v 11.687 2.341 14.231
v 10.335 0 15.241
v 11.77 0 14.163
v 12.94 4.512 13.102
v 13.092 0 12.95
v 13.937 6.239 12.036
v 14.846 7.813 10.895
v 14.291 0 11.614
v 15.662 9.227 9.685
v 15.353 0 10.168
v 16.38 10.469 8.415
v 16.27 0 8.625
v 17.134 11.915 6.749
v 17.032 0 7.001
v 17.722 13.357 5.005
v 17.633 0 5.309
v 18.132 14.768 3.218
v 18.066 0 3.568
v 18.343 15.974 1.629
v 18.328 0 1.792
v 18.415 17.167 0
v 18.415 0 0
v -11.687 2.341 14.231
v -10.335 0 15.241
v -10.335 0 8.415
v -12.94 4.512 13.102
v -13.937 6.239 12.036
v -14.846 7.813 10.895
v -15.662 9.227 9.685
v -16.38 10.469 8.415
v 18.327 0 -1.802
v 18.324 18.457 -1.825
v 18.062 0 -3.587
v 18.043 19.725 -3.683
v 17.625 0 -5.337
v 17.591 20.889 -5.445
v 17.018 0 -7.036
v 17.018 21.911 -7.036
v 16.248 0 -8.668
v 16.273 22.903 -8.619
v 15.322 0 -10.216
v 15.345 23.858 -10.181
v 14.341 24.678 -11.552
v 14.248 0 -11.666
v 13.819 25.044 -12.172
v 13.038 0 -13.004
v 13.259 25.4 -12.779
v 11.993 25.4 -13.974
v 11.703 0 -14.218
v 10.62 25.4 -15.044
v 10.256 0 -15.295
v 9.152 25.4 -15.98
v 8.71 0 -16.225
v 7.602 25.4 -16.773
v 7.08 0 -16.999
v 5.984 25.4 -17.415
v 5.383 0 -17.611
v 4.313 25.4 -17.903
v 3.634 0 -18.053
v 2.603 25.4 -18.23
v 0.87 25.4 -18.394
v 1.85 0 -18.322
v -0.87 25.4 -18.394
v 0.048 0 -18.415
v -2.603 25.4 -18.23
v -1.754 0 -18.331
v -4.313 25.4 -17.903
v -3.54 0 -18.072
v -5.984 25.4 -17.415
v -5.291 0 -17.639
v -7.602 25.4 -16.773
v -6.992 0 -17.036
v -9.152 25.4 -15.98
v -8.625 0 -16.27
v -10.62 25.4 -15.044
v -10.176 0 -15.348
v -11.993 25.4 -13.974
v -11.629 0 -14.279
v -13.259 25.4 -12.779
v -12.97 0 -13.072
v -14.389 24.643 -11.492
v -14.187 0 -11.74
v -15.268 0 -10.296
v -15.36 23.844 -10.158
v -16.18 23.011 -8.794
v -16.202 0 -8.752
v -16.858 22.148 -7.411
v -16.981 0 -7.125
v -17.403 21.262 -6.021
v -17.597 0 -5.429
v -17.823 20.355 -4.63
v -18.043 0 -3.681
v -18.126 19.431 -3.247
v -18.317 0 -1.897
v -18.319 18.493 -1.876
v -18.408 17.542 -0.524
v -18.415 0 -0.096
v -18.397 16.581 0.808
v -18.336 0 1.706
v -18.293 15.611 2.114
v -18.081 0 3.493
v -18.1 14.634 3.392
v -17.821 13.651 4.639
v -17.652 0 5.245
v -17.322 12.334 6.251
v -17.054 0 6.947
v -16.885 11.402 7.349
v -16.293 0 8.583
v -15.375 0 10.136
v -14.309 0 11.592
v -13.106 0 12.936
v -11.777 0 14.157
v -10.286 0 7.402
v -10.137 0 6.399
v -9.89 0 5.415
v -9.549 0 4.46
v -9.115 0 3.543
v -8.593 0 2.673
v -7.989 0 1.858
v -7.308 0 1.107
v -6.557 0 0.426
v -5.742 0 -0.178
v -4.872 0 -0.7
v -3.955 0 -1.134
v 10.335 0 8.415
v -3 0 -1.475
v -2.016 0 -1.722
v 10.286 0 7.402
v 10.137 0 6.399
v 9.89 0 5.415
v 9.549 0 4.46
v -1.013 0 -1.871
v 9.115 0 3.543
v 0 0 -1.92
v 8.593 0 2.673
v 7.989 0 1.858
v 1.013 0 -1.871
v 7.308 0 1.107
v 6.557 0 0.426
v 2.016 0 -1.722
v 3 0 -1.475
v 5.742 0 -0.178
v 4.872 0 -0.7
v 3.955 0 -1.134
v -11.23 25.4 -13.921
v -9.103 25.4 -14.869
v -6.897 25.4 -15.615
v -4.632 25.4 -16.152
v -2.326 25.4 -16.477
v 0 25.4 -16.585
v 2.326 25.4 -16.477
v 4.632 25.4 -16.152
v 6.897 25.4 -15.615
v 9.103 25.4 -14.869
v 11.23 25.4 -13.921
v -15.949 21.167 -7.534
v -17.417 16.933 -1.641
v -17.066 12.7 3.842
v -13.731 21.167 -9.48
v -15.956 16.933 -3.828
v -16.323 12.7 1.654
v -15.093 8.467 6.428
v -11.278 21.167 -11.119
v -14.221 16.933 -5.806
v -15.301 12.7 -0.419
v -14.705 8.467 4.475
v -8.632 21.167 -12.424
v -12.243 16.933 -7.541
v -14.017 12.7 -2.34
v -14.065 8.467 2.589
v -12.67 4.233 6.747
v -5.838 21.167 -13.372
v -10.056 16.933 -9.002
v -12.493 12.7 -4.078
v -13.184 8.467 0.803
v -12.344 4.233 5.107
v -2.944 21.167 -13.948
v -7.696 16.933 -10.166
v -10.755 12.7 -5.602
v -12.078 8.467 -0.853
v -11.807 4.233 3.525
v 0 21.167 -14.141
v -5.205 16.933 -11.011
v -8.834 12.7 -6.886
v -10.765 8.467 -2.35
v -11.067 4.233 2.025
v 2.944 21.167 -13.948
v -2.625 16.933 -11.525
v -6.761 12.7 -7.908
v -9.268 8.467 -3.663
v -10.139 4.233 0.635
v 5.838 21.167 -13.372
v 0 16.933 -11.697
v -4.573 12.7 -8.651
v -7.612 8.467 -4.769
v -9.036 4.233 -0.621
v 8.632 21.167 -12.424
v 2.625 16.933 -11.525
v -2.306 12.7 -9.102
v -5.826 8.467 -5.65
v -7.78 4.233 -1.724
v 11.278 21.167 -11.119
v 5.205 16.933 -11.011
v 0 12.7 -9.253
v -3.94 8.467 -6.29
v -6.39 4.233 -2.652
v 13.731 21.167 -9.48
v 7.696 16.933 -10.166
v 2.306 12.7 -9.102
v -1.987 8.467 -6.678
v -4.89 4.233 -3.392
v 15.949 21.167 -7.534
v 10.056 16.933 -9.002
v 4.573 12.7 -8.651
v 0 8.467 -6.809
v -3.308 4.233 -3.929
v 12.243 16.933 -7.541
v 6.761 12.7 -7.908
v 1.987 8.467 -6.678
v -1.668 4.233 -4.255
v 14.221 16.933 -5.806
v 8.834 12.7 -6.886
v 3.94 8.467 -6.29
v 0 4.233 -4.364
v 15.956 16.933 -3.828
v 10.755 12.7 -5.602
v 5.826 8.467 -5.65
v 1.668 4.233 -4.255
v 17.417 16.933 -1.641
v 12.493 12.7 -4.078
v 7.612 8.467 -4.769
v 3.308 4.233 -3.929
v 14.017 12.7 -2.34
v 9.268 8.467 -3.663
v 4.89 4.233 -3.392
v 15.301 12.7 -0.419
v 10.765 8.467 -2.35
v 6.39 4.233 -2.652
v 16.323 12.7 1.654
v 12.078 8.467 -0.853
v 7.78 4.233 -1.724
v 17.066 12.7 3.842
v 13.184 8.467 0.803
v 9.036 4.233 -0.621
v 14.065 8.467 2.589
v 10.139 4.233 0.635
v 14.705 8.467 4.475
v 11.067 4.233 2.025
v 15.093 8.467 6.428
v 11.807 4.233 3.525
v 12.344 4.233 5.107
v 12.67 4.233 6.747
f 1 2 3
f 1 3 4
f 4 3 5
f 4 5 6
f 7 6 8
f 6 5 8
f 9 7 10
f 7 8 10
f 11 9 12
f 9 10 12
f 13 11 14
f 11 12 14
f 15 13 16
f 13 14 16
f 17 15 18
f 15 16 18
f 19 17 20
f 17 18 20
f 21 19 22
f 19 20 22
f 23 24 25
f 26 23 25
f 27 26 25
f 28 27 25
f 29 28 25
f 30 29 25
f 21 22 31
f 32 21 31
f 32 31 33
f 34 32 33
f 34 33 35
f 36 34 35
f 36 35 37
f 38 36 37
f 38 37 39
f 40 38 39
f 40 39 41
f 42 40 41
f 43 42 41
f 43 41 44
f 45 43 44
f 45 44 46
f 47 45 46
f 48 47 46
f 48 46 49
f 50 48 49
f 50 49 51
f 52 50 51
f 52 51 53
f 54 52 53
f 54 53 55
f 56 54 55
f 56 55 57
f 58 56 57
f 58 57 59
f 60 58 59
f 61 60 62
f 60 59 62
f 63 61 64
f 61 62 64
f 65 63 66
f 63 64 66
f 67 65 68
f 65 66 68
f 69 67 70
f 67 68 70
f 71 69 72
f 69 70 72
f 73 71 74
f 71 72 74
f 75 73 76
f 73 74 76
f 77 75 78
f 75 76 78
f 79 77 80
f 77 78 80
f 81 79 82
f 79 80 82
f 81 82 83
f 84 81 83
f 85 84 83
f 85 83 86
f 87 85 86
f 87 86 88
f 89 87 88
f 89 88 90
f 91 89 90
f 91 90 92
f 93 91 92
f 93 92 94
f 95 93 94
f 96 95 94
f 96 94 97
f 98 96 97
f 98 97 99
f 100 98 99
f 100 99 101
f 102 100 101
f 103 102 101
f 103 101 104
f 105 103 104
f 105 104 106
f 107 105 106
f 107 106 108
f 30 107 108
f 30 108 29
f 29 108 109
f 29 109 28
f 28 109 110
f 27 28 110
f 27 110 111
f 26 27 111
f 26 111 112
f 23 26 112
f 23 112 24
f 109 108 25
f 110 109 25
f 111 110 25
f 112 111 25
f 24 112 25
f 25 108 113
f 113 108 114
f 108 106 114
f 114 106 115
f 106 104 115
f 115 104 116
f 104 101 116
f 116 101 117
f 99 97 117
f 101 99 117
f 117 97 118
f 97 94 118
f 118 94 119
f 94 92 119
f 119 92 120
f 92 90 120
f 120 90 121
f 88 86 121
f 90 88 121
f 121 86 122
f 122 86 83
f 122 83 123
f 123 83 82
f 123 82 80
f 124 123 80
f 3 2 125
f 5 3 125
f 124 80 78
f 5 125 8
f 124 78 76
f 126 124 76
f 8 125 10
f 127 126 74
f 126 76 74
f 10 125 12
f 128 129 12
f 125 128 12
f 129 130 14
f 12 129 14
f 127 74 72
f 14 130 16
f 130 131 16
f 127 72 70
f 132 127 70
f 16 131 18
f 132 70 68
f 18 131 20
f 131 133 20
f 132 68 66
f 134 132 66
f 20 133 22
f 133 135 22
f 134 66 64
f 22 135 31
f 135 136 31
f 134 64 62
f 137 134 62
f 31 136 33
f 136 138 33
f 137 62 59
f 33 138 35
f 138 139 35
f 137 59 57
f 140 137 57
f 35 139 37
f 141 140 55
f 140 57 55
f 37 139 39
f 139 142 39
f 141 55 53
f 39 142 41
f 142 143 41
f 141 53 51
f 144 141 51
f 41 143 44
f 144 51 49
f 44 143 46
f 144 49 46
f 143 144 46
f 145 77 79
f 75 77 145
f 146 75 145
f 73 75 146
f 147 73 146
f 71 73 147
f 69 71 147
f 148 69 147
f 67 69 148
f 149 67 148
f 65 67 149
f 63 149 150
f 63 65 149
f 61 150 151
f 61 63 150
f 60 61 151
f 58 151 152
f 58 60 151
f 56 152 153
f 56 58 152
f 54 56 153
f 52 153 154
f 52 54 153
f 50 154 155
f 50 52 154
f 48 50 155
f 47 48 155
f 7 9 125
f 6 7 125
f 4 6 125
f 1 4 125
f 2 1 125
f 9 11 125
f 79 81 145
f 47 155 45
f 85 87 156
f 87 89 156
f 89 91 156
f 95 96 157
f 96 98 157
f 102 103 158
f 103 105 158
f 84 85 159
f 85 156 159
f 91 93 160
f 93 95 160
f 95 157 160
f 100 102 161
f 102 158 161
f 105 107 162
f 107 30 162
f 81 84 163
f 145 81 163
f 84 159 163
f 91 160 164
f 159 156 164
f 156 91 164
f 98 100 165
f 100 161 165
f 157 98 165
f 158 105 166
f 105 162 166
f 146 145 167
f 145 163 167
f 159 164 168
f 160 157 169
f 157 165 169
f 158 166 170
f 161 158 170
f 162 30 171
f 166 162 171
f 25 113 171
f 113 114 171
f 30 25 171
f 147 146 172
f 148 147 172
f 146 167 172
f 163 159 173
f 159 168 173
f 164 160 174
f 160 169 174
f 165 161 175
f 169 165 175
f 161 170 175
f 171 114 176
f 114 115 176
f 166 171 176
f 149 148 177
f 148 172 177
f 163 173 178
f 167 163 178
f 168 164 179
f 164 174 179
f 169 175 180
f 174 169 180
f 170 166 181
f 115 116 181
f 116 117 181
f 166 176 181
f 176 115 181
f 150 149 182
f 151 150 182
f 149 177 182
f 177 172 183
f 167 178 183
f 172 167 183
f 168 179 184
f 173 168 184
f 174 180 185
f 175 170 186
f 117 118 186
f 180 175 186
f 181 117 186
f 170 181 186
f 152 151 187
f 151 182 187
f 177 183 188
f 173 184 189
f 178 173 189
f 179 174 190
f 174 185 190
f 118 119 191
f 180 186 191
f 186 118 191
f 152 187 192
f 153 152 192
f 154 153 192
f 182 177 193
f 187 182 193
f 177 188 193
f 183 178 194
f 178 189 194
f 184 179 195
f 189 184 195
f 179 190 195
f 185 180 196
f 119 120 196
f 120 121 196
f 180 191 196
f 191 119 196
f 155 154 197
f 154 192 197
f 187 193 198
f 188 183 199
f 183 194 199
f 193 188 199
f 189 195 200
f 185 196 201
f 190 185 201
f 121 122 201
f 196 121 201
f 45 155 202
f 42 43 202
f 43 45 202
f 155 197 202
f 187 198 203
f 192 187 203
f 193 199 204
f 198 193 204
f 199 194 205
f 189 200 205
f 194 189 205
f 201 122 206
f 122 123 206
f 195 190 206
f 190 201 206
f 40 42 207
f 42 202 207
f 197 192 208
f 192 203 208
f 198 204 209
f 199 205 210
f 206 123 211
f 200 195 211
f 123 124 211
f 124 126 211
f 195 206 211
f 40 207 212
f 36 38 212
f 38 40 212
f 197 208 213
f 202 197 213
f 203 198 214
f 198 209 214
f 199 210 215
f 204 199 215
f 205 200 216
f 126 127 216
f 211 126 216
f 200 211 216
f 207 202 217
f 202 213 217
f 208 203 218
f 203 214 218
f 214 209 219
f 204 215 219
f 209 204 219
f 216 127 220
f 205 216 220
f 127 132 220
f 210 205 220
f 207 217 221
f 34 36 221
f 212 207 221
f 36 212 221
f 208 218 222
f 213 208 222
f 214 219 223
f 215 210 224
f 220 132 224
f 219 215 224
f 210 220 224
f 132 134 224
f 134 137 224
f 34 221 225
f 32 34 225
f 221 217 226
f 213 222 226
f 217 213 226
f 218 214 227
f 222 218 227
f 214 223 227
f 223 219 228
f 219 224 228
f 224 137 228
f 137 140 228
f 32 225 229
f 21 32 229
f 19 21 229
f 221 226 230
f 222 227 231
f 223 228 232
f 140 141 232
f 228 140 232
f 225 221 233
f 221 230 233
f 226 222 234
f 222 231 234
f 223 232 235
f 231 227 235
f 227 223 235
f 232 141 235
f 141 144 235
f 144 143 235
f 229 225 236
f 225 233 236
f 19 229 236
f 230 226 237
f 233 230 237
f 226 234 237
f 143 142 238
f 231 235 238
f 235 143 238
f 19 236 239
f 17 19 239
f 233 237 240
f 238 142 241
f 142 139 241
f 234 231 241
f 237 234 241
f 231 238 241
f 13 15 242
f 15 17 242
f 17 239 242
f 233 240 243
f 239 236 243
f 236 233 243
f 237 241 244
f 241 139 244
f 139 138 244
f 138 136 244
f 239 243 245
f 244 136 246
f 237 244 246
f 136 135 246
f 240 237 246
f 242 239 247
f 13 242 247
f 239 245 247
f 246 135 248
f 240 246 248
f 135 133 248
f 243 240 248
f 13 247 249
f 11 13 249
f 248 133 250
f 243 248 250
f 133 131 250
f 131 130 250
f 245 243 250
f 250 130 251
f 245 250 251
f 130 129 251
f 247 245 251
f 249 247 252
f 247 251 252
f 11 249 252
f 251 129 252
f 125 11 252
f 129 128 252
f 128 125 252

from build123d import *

# Parameters (mm, degrees)
BOSS_EXTRUDE1_DEPTH = 25.4
CHAMFER1_SIZE       = 15
CHAMFER1_SIZE_2     = 25.980762114


with BuildPart() as part:
    # Sketch1 → Boss-Extrude1 (new body)
    with BuildSketch(Plane(origin=(0, 0, 0), x_dir=(1, 0, 0), z_dir=(0, 1, 0))):
        with BuildLine():
            ThreePointArc((-10, -8.415), (0, 1.585), (10, -8.415))
            Line((10, -8.415), (10, -15.463254024))
            ThreePointArc((10, -15.463254024), (16.17501507, -8.802335628), (18.415, 0))
            ThreePointArc((18.415, 0), (-8.802335628, 16.17501507), (-10, -15.463254024))
            Line((-10, -15.463254024), (-10, -8.415))
        make_face()
    extrude(amount=BOSS_EXTRUDE1_DEPTH)

    # Chamfer1
    # the kernel refuses this chamfer: 25.980762114, 15 mm, written as the material it takes off along each edge
    with BuildSketch(Plane(origin=(0, 25.4, 8.415), x_dir=(-1, 0, 0), z_dir=(0, 0, 1))) as chamfer1_piece_1:
        Polygon((10 + CHAMFER1_SIZE, 0), (10, CHAMFER1_SIZE_2), (10, 0), align=None)
    revolve(axis=Axis((0, 25.4, 8.415), (0, -1, 0)), revolution_arc=180, mode=Mode.SUBTRACT)
    with BuildSketch(Plane(origin=(-10, 25.4, 82.677713582), x_dir=(0.019326765612700622, -0.9998132206222078, 0), z_dir=(0, 0, -1))) as chamfer1_piece_2:
        Polygon((CHAMFER1_SIZE_2 * 0.999813220604, CHAMFER1_SIZE_2 * 0.0193267656124), (-CHAMFER1_SIZE * 0.0193267656127, CHAMFER1_SIZE * 0.999813220622), (0, 0), align=None)
    extrude(amount=74.262713582, mode=Mode.SUBTRACT)
    with BuildSketch(Plane(origin=(10, 25.4, 8.415), x_dir=(0.9983227437537926, 0.05789386240267136, 0), z_dir=(0, 0, 1))) as chamfer1_piece_3:
        Polygon((CHAMFER1_SIZE * 0.998322743754, -CHAMFER1_SIZE * 0.0578938624027), (-CHAMFER1_SIZE_2 * 0.0578938624016, -CHAMFER1_SIZE_2 * 0.998322743736), (0, 0), align=None)
    extrude(amount=74.262713582, mode=Mode.SUBTRACT)


solid = part.part
